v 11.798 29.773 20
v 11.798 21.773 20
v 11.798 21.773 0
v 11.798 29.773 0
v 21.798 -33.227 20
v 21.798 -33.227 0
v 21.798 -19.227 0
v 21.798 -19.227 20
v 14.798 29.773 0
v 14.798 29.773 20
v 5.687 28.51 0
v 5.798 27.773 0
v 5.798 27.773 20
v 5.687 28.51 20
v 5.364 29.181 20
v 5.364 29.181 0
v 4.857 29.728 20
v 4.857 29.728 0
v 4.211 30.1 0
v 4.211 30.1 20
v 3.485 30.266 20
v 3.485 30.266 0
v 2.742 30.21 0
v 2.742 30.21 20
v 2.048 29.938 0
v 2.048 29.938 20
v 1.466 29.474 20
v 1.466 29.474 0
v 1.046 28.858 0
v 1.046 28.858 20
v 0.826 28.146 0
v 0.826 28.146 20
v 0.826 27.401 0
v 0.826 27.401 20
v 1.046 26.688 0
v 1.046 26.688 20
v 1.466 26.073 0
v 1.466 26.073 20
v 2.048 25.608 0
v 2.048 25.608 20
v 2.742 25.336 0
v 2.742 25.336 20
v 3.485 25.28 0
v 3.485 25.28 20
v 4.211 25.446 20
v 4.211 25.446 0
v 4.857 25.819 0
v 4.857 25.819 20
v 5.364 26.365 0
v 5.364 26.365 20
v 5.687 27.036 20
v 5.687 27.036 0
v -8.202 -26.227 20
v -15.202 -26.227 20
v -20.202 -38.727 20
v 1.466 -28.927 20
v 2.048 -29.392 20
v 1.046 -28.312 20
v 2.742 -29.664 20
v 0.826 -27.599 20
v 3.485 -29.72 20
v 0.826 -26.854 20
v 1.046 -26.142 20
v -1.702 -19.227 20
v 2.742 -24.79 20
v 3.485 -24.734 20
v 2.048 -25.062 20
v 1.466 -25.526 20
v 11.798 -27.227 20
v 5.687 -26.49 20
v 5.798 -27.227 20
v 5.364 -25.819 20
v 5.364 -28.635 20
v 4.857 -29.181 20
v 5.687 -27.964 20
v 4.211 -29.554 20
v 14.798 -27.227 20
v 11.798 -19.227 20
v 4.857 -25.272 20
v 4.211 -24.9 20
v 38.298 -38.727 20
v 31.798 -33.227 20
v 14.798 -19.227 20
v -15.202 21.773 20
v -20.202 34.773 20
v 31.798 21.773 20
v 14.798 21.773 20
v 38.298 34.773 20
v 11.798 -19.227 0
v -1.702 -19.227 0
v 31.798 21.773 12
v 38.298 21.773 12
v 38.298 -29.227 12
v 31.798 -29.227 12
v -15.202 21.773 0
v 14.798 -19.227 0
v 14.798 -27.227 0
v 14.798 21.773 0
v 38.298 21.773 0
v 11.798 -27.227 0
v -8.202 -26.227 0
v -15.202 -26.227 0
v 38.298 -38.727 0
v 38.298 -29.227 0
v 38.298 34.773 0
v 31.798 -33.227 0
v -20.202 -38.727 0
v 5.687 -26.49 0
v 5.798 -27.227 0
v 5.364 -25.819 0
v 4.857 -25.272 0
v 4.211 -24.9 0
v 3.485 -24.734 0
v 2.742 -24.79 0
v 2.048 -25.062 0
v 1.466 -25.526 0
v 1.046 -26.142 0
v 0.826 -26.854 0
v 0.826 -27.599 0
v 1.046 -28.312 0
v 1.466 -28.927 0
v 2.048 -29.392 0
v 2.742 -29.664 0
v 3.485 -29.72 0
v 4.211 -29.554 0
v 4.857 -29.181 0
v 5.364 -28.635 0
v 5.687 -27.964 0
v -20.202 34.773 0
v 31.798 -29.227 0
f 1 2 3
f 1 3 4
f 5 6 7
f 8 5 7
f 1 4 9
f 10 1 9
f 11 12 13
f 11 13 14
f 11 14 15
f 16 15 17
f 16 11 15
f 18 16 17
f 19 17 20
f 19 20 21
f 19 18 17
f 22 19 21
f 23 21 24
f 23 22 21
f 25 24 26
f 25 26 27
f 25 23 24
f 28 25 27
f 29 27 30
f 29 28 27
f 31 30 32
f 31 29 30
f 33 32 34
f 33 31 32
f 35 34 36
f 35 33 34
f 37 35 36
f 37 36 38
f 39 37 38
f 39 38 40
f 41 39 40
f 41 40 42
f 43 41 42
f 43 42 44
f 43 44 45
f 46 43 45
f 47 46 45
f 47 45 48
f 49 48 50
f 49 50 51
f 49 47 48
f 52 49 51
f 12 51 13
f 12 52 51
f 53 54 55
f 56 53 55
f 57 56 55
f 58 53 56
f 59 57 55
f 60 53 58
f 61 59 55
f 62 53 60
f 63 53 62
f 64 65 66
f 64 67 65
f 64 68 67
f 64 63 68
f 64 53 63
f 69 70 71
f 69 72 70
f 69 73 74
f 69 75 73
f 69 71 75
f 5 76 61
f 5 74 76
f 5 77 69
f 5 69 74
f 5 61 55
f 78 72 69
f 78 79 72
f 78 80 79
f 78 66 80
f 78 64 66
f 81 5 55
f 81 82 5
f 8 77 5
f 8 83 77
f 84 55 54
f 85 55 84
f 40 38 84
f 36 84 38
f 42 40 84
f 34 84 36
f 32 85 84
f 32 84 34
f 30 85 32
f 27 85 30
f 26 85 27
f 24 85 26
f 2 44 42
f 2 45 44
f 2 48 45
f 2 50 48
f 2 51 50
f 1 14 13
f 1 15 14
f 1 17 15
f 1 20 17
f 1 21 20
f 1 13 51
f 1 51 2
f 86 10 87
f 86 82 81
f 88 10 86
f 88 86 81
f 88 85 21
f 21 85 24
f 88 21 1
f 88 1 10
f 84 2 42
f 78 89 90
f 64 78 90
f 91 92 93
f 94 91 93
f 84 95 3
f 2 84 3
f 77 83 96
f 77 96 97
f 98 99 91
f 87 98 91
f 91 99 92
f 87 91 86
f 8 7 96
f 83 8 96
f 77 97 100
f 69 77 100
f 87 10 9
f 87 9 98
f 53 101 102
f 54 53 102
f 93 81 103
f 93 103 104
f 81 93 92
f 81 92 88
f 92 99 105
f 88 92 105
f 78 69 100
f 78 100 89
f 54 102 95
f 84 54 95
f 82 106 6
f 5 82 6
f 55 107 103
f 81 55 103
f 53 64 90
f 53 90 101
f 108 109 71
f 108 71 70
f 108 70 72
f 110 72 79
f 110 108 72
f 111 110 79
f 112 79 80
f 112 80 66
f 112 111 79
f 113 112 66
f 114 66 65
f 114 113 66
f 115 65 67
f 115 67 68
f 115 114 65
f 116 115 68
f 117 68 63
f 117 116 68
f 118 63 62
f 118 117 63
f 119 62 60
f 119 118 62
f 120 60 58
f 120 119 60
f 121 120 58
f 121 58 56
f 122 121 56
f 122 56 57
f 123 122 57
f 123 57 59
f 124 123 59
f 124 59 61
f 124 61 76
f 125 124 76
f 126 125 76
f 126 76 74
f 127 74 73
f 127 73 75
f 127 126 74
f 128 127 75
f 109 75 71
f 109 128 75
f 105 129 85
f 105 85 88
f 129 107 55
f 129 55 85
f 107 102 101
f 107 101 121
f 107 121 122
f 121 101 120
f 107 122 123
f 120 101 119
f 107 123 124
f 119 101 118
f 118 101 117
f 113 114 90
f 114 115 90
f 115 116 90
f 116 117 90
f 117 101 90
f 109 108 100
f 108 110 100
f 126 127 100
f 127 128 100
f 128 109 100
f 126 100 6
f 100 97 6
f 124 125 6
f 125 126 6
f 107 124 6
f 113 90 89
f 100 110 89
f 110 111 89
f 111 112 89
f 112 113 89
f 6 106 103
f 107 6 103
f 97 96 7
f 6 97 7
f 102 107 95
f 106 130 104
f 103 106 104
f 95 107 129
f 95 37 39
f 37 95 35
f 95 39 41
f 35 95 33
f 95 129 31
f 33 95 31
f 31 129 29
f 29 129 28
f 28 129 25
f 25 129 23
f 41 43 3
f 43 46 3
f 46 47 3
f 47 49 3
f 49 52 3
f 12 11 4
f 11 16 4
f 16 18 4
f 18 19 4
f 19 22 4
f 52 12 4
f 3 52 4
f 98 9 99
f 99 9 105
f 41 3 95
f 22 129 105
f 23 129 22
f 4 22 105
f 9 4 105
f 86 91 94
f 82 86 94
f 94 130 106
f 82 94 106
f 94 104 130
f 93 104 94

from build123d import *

# Parameters (mm, degrees)
F0_W     = 58.5
F0_H     = 73.5
F0_R     = 2.5
F1_DEPTH = 20
F2_W     = 47
F2_H     = 12
F2_W_2   = 4
F3_DEPTH = 6.5


with BuildPart() as f1:
    # F0 (on Top) → F1 (new body)
    with BuildSketch(Plane.XY):
        with Locations((9.048133, -1.976883)):
            Rectangle(F0_W, F0_H)
        with Locations((3.298133, -27.226883)):
            Circle(F0_R, mode=Mode.SUBTRACT)
        Polygon((14.798133, 21.773117), (21.798133, 21.773117), (31.798133, 21.773117), (31.798133, -33.226883), (21.798133, -33.226883), (21.798133, -19.226883), (14.798133, -19.226883), (14.798133, -27.226883), (11.798133, -27.226883), (11.798133, -19.226883), (3.298133, -19.226883), (-1.701867, -19.226883), (-8.201867, -26.226883), (-15.201867, -26.226883), (-15.201867, -19.226883), (-15.201867, 21.773117), (3.298133, 21.773117), (11.798133, 21.773117), (11.798133, 29.773117), (14.798133, 29.773117), align=None, mode=Mode.SUBTRACT)
        with Locations((3.298133, 27.773117)):
            Circle(F0_R, mode=Mode.SUBTRACT)
    extrude(amount=F1_DEPTH)

    # F2 (on face) → F3 (cut, through all)
    with BuildSketch(Plane.YZ.offset(38.298133)):
        with Locations((-5.726883, 6)):
            Rectangle(F2_W, F2_H)
        with Locations((19.773117, 6)):
            Rectangle(F2_W_2, F2_H)
    extrude(amount=-F3_DEPTH, mode=Mode.SUBTRACT)


solid = f1.part
